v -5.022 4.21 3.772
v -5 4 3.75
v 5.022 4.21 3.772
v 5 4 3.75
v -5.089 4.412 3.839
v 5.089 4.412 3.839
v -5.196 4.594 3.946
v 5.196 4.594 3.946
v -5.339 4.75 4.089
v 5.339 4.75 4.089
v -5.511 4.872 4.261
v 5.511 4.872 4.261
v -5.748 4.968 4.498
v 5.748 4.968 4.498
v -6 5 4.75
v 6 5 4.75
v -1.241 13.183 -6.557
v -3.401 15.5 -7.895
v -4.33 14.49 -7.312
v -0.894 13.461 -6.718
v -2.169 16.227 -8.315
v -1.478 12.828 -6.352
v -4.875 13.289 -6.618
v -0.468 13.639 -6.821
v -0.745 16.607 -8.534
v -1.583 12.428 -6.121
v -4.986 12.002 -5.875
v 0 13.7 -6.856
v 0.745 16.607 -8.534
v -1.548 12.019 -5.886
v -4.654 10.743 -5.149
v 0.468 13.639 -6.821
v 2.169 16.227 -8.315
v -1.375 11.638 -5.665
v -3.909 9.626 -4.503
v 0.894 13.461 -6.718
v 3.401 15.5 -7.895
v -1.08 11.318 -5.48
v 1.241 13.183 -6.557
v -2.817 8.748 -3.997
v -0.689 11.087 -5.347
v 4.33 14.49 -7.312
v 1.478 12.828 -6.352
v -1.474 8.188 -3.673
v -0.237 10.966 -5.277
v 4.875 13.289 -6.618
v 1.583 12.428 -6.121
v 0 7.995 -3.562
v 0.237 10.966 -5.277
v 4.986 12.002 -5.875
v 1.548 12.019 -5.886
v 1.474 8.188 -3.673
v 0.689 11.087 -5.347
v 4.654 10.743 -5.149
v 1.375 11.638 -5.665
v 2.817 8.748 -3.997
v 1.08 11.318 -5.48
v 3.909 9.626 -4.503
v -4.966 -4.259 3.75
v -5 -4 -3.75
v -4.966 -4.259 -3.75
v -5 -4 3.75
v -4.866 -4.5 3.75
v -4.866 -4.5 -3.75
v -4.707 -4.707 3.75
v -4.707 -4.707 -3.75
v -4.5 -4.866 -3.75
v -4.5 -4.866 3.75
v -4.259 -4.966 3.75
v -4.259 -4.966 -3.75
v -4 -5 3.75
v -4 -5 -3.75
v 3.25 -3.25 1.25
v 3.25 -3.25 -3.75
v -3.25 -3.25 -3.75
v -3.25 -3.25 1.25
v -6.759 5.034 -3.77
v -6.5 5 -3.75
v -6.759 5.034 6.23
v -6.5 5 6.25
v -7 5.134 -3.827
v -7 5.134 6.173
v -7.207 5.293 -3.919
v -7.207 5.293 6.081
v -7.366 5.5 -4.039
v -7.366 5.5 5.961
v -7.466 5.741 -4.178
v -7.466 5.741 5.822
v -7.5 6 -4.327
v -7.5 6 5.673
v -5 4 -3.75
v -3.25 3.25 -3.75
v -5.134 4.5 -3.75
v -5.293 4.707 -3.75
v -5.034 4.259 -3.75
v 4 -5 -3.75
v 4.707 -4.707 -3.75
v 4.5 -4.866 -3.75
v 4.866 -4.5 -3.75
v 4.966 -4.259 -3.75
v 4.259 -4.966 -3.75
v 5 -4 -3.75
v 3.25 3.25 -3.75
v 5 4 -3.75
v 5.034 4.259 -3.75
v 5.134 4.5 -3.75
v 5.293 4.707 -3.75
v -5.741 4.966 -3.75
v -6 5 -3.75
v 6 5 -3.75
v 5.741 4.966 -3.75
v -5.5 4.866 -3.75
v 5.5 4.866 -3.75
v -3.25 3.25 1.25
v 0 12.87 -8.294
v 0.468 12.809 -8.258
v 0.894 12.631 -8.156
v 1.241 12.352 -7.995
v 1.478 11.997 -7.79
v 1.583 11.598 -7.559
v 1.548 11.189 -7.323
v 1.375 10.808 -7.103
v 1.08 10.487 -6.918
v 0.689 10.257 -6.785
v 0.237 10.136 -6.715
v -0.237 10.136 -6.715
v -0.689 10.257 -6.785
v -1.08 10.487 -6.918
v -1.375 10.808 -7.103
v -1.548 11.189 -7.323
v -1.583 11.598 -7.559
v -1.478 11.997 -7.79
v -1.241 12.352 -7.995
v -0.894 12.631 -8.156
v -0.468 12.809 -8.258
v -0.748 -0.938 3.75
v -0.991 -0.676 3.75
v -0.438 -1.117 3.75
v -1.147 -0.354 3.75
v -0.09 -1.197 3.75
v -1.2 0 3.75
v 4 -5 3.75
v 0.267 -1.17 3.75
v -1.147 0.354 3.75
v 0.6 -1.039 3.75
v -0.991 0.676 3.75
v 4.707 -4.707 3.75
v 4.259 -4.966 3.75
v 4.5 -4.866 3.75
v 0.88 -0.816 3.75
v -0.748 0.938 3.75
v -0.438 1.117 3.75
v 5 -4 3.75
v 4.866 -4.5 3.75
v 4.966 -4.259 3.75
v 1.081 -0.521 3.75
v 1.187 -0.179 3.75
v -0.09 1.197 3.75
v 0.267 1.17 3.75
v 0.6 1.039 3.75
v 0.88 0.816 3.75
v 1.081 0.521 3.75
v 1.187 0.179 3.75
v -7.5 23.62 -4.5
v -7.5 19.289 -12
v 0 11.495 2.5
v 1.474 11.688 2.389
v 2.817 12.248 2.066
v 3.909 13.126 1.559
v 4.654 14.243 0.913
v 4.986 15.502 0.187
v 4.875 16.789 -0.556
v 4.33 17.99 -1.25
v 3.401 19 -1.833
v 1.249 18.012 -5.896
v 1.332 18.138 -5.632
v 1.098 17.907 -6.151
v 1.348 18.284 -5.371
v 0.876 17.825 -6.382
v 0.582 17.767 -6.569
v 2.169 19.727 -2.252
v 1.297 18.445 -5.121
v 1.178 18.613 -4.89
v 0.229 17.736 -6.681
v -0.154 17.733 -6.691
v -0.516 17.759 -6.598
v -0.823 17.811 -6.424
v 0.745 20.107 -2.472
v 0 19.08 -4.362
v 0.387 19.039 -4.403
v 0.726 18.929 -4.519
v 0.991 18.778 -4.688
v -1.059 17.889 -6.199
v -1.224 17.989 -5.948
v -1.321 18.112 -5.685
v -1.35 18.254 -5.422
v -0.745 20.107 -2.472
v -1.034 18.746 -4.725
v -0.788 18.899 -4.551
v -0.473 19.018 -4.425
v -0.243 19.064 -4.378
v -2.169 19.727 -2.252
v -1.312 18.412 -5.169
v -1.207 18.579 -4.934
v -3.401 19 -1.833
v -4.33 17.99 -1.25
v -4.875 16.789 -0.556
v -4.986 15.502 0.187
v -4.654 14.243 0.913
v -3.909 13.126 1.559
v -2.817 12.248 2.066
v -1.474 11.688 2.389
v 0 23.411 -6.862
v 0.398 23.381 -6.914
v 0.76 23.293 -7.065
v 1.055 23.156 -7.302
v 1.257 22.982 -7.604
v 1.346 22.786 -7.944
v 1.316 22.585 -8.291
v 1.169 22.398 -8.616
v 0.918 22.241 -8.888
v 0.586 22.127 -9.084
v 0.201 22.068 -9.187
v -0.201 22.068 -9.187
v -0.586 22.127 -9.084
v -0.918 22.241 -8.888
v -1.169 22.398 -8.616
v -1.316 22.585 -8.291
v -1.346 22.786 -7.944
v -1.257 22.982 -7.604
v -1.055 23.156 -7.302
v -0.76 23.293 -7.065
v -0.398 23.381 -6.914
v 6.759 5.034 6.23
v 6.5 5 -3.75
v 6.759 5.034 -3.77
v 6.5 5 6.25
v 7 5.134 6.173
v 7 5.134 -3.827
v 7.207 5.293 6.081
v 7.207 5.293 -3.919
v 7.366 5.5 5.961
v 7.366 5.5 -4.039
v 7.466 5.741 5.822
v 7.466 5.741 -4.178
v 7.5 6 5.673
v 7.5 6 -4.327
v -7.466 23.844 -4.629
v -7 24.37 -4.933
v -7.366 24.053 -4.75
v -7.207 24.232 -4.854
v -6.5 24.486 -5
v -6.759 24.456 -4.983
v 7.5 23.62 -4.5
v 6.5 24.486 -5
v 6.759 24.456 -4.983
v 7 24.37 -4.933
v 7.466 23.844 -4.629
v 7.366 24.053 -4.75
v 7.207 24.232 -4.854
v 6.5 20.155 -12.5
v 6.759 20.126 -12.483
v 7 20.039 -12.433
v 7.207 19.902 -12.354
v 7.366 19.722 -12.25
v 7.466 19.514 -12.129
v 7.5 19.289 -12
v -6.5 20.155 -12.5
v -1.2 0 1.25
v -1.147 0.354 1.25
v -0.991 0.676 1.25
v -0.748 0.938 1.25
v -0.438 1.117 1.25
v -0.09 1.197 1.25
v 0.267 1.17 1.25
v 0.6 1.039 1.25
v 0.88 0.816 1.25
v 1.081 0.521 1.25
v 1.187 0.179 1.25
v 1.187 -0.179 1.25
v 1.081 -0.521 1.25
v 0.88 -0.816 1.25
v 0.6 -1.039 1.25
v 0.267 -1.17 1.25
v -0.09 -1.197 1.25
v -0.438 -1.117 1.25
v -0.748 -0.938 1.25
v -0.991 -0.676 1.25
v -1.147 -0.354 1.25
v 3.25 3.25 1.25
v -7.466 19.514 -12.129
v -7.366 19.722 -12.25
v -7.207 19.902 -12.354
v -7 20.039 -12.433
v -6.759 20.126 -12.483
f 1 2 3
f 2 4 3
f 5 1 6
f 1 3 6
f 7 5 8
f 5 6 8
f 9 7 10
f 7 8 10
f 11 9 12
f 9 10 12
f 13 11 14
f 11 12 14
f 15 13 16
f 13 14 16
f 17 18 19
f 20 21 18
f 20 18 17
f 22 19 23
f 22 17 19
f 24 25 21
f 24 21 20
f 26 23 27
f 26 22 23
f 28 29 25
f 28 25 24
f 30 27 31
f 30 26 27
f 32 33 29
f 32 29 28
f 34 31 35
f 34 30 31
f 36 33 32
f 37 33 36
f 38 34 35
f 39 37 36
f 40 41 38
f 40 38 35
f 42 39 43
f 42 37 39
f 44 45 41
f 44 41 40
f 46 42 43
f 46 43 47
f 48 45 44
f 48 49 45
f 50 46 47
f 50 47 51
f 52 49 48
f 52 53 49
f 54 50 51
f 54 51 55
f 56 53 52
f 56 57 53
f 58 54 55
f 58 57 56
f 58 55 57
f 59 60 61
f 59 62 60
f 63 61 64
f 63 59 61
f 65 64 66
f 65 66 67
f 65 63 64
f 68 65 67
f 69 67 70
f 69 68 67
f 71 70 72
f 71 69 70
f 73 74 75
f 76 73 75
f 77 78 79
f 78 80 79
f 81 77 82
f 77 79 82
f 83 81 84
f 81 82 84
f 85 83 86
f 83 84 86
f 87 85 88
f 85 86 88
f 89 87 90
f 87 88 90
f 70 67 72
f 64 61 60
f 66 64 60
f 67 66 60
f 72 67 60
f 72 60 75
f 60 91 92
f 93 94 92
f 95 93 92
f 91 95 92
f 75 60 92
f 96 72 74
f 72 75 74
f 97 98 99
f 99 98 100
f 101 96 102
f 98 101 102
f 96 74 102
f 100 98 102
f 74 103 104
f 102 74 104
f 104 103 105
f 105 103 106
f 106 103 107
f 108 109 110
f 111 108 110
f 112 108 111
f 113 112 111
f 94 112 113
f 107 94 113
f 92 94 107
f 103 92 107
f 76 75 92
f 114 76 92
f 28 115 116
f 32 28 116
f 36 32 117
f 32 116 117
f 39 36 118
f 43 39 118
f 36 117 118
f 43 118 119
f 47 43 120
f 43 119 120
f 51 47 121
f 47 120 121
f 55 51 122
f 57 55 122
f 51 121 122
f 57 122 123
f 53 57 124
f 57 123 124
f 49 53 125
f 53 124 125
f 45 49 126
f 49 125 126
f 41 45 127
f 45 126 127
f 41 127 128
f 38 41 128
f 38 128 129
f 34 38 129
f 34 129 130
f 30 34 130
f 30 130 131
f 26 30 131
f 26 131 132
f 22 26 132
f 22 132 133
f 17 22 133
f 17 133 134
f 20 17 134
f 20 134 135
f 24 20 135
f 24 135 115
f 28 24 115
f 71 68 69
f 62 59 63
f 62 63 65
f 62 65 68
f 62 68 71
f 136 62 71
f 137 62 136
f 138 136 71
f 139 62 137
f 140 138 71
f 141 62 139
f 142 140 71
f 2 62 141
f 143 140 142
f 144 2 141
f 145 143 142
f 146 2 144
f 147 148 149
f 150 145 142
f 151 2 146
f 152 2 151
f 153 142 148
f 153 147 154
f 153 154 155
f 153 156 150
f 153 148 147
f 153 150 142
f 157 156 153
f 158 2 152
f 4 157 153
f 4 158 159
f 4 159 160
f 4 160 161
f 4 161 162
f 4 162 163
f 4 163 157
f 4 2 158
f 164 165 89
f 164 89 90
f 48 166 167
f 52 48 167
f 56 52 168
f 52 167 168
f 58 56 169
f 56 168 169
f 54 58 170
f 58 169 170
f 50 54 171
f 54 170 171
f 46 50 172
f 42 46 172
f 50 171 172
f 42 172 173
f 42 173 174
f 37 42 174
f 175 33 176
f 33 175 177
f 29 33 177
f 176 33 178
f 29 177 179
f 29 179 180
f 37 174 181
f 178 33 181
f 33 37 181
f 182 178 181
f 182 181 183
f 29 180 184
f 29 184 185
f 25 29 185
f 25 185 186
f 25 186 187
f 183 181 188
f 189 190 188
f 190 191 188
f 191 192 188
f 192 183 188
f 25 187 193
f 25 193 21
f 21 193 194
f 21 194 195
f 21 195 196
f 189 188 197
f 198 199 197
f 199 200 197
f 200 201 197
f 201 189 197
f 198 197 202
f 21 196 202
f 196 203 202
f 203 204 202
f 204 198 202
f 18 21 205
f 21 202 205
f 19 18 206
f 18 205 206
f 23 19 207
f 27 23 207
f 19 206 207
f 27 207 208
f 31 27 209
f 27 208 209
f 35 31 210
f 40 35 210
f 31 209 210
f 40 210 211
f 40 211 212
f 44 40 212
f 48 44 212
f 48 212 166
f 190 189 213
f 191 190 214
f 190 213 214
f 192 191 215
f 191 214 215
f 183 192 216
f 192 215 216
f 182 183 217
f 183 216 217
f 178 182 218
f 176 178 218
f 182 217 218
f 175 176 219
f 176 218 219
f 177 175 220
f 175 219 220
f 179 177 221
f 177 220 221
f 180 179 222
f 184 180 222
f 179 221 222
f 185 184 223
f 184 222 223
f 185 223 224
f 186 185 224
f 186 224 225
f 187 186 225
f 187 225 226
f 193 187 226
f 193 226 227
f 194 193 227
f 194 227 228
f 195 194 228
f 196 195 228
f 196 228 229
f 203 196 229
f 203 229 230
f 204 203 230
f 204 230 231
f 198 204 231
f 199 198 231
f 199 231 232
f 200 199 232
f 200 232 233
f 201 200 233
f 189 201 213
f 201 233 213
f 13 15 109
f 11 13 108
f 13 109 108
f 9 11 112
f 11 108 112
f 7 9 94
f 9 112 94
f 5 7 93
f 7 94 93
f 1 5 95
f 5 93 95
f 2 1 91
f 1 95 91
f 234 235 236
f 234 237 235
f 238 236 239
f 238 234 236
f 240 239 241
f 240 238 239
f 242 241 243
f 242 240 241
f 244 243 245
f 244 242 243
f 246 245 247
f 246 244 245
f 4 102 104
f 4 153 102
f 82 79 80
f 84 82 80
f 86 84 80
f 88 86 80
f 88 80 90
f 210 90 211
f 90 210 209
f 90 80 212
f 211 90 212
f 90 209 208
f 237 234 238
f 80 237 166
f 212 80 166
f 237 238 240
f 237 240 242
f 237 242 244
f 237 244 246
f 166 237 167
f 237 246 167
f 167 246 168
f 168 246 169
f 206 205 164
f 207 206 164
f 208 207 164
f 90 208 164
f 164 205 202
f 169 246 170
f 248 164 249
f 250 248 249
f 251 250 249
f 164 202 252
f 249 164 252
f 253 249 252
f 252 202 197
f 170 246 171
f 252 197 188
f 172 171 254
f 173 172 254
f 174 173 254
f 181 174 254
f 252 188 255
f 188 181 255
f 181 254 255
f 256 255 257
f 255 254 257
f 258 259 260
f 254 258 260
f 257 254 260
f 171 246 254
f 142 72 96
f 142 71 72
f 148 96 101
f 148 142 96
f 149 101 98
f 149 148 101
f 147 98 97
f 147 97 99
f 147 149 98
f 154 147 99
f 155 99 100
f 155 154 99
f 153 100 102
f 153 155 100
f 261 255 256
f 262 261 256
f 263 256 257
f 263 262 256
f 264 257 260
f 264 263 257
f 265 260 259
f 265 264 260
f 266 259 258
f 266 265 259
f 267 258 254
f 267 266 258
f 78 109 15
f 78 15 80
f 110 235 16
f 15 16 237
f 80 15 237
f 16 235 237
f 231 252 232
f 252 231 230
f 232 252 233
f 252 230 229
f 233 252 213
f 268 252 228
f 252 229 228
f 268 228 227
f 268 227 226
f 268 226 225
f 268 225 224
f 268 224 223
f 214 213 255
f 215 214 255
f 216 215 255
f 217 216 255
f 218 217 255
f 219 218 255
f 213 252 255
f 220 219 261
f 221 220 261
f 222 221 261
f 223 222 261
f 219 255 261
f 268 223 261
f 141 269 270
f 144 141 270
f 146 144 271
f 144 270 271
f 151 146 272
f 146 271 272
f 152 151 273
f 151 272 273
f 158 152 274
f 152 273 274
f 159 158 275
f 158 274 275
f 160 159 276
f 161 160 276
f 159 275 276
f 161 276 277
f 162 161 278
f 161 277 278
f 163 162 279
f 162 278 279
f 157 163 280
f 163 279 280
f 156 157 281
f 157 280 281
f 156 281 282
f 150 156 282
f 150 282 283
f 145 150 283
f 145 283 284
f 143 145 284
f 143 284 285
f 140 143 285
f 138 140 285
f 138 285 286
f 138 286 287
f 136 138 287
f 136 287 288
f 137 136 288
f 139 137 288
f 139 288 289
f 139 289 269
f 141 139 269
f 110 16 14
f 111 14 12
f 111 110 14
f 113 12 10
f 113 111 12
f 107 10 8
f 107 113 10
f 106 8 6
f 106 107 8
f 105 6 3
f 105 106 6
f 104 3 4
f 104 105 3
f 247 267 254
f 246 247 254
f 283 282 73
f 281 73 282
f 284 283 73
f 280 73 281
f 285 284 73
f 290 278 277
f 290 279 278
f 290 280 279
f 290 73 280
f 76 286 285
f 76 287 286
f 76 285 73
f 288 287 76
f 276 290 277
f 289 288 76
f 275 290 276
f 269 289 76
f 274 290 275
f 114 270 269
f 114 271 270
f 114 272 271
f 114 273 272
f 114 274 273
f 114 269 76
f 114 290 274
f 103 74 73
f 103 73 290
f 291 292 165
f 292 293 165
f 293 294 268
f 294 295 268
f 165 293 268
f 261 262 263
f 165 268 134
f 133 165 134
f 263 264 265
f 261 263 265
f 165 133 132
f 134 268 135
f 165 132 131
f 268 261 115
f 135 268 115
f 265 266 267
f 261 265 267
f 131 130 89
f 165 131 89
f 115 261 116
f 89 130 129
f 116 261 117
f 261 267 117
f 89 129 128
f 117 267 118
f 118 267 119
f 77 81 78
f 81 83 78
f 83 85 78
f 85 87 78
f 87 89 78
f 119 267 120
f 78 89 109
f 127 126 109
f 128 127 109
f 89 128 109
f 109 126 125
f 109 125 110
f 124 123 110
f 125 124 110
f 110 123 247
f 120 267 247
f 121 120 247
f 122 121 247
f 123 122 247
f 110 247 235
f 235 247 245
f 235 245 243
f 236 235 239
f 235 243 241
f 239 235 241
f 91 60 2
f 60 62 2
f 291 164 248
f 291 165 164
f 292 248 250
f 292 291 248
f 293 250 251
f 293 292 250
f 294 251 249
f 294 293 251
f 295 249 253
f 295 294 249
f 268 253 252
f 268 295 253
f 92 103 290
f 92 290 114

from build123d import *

# Parameters (mm, degrees)
SKETCH1_W               = 10
SKETCH1_H               = 10
BOSS_EXTRUDE1_DEPTH     = 3.75
SKETCH2_W               = 6.5
SKETCH2_H               = 6.5
CUT_EXTRUDE1_DEPTH      = 5
BOSS_EXTRUDE2_DEPTH     = 7.5
M2_CLEARANCE_HOLE1_D    = 2.4
FILLET5_R               = 1
FILLET1_R               = 1
FILLET3_R               = 1
SKETCH17_R              = 5
CUT_EXTRUDE2_DEPTH      = 7
SKETCH5_R               = 1.5875
CUT_EXTRUDE3_DEPTH      = 5
FILLET4_R               = 1
CUT_EXTRUDE4_REACH      = 34.182
CUT_EXTRUDE4_END_RADIUS = 5
SKETCH18_R              = 1.35


with BuildPart() as part:
    # Sketch1 → Boss-Extrude1 (new, symmetric)
    with BuildSketch(Plane.XY):
        Rectangle(SKETCH1_W, SKETCH1_H)
    extrude(amount=BOSS_EXTRUDE1_DEPTH, both=True)

    # Sketch2 → Cut-Extrude1 (cut)
    with BuildSketch(Plane(origin=(0, 0, -3.75), x_dir=(-1, 0, 0), z_dir=(0, 0, -1))):
        Rectangle(SKETCH2_W, SKETCH2_H)
    extrude(amount=-CUT_EXTRUDE1_DEPTH, mode=Mode.SUBTRACT)

    # Sketch3 → Boss-Extrude2 (add, symmetric)
    with BuildSketch(Plane(origin=(0, 0, 0), x_dir=(0, 0, -1), z_dir=(1, 0, 0))):
        Polygon((-6.25, 5), (5, 24.485571585), (12.5, 20.155444566), (3.75, 5), align=None)
    extrude(amount=BOSS_EXTRUDE2_DEPTH, both=True)

    # M2 Clearance Hole1 (through all)
    with Locations(Plane.XY.offset(3.75)):
        with Locations((0, 0)):
            Hole(M2_CLEARANCE_HOLE1_D / 2)

    # Fillet5
    fillet5_edges = [part.edges().sort_by_distance(p)[0] for p in [
        (-7.5, 5, 1.25),
        (-7.5, 22.320508076, -8.75),
        (7.5, 5, 1.25),
        (7.5, 22.320508076, -8.75),
    ]]
    fillet(fillet5_edges, radius=FILLET5_R)

    # Fillet1
    fillet1_edges = [part.edges().sort_by_distance(p)[0] for p in [
        (-5, 5, 0),
        (5, 5, 0),
    ]]
    fillet(fillet1_edges, radius=FILLET1_R)

    # Fillet3
    fillet3_edges = [part.edges().sort_by_distance(p)[0] for p in [
        (5, -5, 0),
        (-5, -5, 0),
    ]]
    fillet(fillet3_edges, radius=FILLET3_R)

    # Sketch17 → Cut-Extrude2 (cut)
    with BuildSketch(Plane(origin=(0, 3.956329387, 6.852563509), x_dir=(1, 0, 0), z_dir=(0, 0.5000000000000039, 0.8660254037844365))):
        with Locations(Location((0, 13.705127019, 0), (0, 0, 270))):
            Circle(SKETCH17_R)
    extrude(amount=-CUT_EXTRUDE2_DEPTH, mode=Mode.SUBTRACT)

    # Sketch5 → Cut-Extrude3 (cut)
    with BuildSketch(Plane(origin=(0, -0.373797632, -0.647436491), x_dir=(-1, 0, 0), z_dir=(0, -0.5000000000000038, -0.8660254037844366))):
        with Locations(Location((0, 13.705127019, 0), (0, 0, 90))):
            Circle(SKETCH5_R)
    extrude(amount=-CUT_EXTRUDE3_DEPTH, mode=Mode.SUBTRACT)

    # Fillet4
    fillet4_edges = [part.edges().sort_by_distance(p)[0] for p in [
        (0, 5, 3.75),
    ]]
    fillet(fillet4_edges, radius=FILLET4_R)

    # Cut-Extrude4: up to this cylinder (the profile starts outside it)
    cut_extrude4_end = Plane(origin=(0, 14.075317613, -3.031088799), z_dir=(0, 0.5000000000000039, 0.8660254037844365)) * Cylinder(CUT_EXTRUDE4_END_RADIUS, 79.364, mode=Mode.PRIVATE)
    # Sketch18 → Cut-Extrude4 (cut, up to the surface)
    with BuildSketch(Plane(origin=(0, 20.529242198, -11.852563509), x_dir=(1, 0, 0), z_dir=(0, 0.8660254037844366, -0.5000000000000038)), mode=Mode.PRIVATE) as cut_extrude4_sk1:
        with Locations(Location((0, -4.412658774, 0), (0, 0, 270))):
            Circle(SKETCH18_R)
    cut_extrude4_tool1 = extrude(cut_extrude4_sk1.sketch, amount=-CUT_EXTRUDE4_REACH, mode=Mode.PRIVATE) - cut_extrude4_end
    add(cut_extrude4_tool1.solids().sort_by_distance((0, 22.735572, -8.031089))[0], mode=Mode.SUBTRACT)


solid = part.part
